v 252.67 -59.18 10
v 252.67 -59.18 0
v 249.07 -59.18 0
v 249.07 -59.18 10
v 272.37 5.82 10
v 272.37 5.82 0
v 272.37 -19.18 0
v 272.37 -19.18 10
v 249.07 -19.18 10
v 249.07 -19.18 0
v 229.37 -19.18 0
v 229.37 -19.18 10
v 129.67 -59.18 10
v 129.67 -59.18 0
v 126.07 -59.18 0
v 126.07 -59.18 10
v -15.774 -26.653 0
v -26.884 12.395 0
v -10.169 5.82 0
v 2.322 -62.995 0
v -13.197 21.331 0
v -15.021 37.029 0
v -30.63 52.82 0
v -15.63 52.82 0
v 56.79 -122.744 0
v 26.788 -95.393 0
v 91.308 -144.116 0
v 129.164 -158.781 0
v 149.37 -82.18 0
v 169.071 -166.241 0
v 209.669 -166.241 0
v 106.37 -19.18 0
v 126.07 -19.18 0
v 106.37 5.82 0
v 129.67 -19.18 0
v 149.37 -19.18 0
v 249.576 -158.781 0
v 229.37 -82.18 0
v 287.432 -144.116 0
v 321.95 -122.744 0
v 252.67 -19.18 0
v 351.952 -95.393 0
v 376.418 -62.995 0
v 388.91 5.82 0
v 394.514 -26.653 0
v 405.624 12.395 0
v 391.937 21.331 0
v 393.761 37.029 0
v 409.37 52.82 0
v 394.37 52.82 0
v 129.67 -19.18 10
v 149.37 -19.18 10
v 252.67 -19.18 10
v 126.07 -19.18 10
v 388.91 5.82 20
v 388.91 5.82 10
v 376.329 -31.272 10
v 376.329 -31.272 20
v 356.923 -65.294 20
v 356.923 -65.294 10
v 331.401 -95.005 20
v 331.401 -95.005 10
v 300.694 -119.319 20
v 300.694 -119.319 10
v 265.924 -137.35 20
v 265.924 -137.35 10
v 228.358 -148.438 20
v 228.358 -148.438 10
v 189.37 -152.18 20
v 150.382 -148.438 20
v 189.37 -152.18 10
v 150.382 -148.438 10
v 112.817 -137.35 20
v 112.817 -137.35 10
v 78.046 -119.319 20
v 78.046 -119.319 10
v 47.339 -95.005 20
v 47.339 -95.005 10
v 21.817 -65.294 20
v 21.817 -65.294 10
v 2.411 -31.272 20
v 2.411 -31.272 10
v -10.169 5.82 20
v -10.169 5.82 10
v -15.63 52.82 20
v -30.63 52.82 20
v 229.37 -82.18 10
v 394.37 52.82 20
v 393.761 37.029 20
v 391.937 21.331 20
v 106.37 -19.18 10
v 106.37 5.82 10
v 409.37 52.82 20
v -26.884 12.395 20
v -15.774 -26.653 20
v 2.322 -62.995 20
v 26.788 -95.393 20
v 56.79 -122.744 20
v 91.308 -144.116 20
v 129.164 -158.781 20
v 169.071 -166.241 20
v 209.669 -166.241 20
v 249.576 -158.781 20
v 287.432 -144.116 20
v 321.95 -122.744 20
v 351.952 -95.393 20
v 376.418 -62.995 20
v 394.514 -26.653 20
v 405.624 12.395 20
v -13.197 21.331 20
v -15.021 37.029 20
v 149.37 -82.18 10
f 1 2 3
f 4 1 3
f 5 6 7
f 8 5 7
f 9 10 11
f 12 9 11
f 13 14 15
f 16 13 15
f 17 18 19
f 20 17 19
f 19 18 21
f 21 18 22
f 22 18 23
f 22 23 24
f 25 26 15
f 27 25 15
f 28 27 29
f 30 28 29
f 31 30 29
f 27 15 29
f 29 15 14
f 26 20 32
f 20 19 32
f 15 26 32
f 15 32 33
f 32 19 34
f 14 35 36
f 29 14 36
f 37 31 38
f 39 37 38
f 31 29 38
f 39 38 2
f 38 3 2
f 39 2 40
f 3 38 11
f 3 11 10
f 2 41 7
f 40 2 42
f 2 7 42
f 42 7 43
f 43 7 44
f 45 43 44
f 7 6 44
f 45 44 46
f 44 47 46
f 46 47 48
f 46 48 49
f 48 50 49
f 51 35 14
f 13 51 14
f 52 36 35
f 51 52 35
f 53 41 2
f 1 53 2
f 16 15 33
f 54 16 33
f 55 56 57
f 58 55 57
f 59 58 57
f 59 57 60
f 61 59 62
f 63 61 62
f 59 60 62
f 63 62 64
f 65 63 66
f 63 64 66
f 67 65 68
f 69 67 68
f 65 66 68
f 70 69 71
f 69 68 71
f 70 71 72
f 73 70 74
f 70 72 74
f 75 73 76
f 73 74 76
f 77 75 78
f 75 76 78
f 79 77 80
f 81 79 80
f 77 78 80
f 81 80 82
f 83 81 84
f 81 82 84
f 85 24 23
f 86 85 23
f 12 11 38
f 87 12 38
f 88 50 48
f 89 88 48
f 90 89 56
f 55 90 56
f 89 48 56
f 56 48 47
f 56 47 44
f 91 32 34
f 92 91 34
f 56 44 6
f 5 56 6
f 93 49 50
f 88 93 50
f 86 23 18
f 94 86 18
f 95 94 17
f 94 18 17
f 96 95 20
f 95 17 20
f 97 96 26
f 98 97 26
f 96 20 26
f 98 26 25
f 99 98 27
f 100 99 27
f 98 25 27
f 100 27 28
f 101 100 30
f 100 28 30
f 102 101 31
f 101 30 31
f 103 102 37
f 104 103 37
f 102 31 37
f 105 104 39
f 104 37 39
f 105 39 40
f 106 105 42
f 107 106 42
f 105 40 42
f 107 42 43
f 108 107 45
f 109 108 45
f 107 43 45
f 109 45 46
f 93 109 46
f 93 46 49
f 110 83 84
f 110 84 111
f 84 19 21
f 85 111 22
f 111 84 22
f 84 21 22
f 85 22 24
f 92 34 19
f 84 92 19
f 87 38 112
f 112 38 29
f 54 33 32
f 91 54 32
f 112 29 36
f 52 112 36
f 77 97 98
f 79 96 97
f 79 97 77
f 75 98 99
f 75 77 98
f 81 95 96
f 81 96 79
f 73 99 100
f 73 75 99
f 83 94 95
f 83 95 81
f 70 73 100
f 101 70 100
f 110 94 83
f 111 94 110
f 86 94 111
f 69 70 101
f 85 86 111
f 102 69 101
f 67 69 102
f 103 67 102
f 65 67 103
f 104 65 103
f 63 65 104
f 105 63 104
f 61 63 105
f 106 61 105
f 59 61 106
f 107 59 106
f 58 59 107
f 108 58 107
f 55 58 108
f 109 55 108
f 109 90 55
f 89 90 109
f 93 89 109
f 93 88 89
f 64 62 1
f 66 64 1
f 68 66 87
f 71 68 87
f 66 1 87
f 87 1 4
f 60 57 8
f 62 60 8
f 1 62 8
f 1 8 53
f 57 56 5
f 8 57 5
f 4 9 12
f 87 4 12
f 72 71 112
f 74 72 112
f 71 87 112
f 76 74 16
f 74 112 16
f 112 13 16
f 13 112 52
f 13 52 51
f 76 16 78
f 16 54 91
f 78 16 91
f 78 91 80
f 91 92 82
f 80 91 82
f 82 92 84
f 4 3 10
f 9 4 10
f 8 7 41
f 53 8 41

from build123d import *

# Parameters (mm, degrees)
BOSS_EXTRUDE1_DEPTH = 20
CUT_EXTRUDE2_START  = -10
CUT_EXTRUDE2_DEPTH  = 10


with BuildPart() as part:
    # Sketch1 → Boss-Extrude1 (new body)
    with BuildSketch(Plane.XY):
        with BuildLine():
            Line((106.370051436, 5.820149254), (-10.169418344, 5.820149254))
            ThreePointArc((-10.169418344, 5.820149254), (-14.260240152, 29.162077744), (-15.629948564, 52.820149254))
            Line((-15.629948564, 52.820149254), (-30.629948564, 52.820149254))
            ThreePointArc((-30.629948564, 52.820149254), (189.370051436, -167.179850746), (409.370051436, 52.820149254))
            Line((409.370051436, 52.820149254), (394.370051436, 52.820149254))
            ThreePointArc((394.370051436, 52.820149254), (393.000343025, 29.162077744), (388.909521216, 5.820149254))
            Line((388.909521216, 5.820149254), (272.370051436, 5.820149254))
            Line((272.370051436, 5.820149254), (272.370051436, -19.179850746))
            Line((272.370051436, -19.179850746), (252.670051436, -19.179850746))
            Line((252.670051436, -19.179850746), (252.670051436, -59.179850746))
            Line((252.670051436, -59.179850746), (249.070051436, -59.179850746))
            Line((249.070051436, -59.179850746), (249.070051436, -19.179850746))
            Line((249.070051436, -19.179850746), (229.370051436, -19.179850746))
            Line((229.370051436, -19.179850746), (229.370051436, -82.179850746))
            Line((229.370051436, -82.179850746), (149.370051436, -82.179850746))
            Line((149.370051436, -82.179850746), (149.370051436, -19.179850746))
            Line((149.370051436, -19.179850746), (129.670051436, -19.179850746))
            Line((129.670051436, -19.179850746), (129.670051436, -59.179850746))
            Line((129.670051436, -59.179850746), (126.070051436, -59.179850746))
            Line((126.070051436, -59.179850746), (126.070051436, -19.179850746))
            Line((126.070051436, -19.179850746), (106.370051436, -19.179850746))
            Line((106.370051436, -19.179850746), (106.370051436, 5.820149254))
        make_face()
    extrude(amount=BOSS_EXTRUDE1_DEPTH)

    # Sketch2 → Cut-Extrude2 (cut)
    with BuildSketch(Plane.XY.offset(20).offset(CUT_EXTRUDE2_START)):
        with BuildLine():
            Line((-10.169418344, 5.820149254), (106.370051436, 5.820149254))
            Line((106.370051436, 5.820149254), (106.370051436, -19.179850746))
            Line((106.370051436, -19.179850746), (126.070051436, -19.179850746))
            Line((126.070051436, -19.179850746), (126.070051436, -59.179850746))
            Line((126.070051436, -59.179850746), (129.670051436, -59.179850746))
            Line((129.670051436, -59.179850746), (129.670051436, -19.179850746))
            Line((129.670051436, -19.179850746), (149.370051436, -19.179850746))
            Line((149.370051436, -19.179850746), (149.370051436, -82.179850746))
            Line((149.370051436, -82.179850746), (229.370051436, -82.179850746))
            Line((229.370051436, -82.179850746), (229.370051436, -19.179850746))
            Line((229.370051436, -19.179850746), (249.070051436, -19.179850746))
            Line((249.070051436, -19.179850746), (249.070051436, -59.179850746))
            Line((249.070051436, -59.179850746), (252.670051436, -59.179850746))
            Line((252.670051436, -59.179850746), (252.670051436, -19.179850746))
            Line((252.670051436, -19.179850746), (272.370051436, -19.179850746))
            Line((272.370051436, -19.179850746), (272.370051436, 5.820149254))
            Line((272.370051436, 5.820149254), (388.909521216, 5.820149254))
            ThreePointArc((388.909521216, 5.820149254), (189.370051436, -152.179850746), (-10.169418344, 5.820149254))
        make_face()
    extrude(amount=CUT_EXTRUDE2_DEPTH, mode=Mode.SUBTRACT)


solid = part.part
